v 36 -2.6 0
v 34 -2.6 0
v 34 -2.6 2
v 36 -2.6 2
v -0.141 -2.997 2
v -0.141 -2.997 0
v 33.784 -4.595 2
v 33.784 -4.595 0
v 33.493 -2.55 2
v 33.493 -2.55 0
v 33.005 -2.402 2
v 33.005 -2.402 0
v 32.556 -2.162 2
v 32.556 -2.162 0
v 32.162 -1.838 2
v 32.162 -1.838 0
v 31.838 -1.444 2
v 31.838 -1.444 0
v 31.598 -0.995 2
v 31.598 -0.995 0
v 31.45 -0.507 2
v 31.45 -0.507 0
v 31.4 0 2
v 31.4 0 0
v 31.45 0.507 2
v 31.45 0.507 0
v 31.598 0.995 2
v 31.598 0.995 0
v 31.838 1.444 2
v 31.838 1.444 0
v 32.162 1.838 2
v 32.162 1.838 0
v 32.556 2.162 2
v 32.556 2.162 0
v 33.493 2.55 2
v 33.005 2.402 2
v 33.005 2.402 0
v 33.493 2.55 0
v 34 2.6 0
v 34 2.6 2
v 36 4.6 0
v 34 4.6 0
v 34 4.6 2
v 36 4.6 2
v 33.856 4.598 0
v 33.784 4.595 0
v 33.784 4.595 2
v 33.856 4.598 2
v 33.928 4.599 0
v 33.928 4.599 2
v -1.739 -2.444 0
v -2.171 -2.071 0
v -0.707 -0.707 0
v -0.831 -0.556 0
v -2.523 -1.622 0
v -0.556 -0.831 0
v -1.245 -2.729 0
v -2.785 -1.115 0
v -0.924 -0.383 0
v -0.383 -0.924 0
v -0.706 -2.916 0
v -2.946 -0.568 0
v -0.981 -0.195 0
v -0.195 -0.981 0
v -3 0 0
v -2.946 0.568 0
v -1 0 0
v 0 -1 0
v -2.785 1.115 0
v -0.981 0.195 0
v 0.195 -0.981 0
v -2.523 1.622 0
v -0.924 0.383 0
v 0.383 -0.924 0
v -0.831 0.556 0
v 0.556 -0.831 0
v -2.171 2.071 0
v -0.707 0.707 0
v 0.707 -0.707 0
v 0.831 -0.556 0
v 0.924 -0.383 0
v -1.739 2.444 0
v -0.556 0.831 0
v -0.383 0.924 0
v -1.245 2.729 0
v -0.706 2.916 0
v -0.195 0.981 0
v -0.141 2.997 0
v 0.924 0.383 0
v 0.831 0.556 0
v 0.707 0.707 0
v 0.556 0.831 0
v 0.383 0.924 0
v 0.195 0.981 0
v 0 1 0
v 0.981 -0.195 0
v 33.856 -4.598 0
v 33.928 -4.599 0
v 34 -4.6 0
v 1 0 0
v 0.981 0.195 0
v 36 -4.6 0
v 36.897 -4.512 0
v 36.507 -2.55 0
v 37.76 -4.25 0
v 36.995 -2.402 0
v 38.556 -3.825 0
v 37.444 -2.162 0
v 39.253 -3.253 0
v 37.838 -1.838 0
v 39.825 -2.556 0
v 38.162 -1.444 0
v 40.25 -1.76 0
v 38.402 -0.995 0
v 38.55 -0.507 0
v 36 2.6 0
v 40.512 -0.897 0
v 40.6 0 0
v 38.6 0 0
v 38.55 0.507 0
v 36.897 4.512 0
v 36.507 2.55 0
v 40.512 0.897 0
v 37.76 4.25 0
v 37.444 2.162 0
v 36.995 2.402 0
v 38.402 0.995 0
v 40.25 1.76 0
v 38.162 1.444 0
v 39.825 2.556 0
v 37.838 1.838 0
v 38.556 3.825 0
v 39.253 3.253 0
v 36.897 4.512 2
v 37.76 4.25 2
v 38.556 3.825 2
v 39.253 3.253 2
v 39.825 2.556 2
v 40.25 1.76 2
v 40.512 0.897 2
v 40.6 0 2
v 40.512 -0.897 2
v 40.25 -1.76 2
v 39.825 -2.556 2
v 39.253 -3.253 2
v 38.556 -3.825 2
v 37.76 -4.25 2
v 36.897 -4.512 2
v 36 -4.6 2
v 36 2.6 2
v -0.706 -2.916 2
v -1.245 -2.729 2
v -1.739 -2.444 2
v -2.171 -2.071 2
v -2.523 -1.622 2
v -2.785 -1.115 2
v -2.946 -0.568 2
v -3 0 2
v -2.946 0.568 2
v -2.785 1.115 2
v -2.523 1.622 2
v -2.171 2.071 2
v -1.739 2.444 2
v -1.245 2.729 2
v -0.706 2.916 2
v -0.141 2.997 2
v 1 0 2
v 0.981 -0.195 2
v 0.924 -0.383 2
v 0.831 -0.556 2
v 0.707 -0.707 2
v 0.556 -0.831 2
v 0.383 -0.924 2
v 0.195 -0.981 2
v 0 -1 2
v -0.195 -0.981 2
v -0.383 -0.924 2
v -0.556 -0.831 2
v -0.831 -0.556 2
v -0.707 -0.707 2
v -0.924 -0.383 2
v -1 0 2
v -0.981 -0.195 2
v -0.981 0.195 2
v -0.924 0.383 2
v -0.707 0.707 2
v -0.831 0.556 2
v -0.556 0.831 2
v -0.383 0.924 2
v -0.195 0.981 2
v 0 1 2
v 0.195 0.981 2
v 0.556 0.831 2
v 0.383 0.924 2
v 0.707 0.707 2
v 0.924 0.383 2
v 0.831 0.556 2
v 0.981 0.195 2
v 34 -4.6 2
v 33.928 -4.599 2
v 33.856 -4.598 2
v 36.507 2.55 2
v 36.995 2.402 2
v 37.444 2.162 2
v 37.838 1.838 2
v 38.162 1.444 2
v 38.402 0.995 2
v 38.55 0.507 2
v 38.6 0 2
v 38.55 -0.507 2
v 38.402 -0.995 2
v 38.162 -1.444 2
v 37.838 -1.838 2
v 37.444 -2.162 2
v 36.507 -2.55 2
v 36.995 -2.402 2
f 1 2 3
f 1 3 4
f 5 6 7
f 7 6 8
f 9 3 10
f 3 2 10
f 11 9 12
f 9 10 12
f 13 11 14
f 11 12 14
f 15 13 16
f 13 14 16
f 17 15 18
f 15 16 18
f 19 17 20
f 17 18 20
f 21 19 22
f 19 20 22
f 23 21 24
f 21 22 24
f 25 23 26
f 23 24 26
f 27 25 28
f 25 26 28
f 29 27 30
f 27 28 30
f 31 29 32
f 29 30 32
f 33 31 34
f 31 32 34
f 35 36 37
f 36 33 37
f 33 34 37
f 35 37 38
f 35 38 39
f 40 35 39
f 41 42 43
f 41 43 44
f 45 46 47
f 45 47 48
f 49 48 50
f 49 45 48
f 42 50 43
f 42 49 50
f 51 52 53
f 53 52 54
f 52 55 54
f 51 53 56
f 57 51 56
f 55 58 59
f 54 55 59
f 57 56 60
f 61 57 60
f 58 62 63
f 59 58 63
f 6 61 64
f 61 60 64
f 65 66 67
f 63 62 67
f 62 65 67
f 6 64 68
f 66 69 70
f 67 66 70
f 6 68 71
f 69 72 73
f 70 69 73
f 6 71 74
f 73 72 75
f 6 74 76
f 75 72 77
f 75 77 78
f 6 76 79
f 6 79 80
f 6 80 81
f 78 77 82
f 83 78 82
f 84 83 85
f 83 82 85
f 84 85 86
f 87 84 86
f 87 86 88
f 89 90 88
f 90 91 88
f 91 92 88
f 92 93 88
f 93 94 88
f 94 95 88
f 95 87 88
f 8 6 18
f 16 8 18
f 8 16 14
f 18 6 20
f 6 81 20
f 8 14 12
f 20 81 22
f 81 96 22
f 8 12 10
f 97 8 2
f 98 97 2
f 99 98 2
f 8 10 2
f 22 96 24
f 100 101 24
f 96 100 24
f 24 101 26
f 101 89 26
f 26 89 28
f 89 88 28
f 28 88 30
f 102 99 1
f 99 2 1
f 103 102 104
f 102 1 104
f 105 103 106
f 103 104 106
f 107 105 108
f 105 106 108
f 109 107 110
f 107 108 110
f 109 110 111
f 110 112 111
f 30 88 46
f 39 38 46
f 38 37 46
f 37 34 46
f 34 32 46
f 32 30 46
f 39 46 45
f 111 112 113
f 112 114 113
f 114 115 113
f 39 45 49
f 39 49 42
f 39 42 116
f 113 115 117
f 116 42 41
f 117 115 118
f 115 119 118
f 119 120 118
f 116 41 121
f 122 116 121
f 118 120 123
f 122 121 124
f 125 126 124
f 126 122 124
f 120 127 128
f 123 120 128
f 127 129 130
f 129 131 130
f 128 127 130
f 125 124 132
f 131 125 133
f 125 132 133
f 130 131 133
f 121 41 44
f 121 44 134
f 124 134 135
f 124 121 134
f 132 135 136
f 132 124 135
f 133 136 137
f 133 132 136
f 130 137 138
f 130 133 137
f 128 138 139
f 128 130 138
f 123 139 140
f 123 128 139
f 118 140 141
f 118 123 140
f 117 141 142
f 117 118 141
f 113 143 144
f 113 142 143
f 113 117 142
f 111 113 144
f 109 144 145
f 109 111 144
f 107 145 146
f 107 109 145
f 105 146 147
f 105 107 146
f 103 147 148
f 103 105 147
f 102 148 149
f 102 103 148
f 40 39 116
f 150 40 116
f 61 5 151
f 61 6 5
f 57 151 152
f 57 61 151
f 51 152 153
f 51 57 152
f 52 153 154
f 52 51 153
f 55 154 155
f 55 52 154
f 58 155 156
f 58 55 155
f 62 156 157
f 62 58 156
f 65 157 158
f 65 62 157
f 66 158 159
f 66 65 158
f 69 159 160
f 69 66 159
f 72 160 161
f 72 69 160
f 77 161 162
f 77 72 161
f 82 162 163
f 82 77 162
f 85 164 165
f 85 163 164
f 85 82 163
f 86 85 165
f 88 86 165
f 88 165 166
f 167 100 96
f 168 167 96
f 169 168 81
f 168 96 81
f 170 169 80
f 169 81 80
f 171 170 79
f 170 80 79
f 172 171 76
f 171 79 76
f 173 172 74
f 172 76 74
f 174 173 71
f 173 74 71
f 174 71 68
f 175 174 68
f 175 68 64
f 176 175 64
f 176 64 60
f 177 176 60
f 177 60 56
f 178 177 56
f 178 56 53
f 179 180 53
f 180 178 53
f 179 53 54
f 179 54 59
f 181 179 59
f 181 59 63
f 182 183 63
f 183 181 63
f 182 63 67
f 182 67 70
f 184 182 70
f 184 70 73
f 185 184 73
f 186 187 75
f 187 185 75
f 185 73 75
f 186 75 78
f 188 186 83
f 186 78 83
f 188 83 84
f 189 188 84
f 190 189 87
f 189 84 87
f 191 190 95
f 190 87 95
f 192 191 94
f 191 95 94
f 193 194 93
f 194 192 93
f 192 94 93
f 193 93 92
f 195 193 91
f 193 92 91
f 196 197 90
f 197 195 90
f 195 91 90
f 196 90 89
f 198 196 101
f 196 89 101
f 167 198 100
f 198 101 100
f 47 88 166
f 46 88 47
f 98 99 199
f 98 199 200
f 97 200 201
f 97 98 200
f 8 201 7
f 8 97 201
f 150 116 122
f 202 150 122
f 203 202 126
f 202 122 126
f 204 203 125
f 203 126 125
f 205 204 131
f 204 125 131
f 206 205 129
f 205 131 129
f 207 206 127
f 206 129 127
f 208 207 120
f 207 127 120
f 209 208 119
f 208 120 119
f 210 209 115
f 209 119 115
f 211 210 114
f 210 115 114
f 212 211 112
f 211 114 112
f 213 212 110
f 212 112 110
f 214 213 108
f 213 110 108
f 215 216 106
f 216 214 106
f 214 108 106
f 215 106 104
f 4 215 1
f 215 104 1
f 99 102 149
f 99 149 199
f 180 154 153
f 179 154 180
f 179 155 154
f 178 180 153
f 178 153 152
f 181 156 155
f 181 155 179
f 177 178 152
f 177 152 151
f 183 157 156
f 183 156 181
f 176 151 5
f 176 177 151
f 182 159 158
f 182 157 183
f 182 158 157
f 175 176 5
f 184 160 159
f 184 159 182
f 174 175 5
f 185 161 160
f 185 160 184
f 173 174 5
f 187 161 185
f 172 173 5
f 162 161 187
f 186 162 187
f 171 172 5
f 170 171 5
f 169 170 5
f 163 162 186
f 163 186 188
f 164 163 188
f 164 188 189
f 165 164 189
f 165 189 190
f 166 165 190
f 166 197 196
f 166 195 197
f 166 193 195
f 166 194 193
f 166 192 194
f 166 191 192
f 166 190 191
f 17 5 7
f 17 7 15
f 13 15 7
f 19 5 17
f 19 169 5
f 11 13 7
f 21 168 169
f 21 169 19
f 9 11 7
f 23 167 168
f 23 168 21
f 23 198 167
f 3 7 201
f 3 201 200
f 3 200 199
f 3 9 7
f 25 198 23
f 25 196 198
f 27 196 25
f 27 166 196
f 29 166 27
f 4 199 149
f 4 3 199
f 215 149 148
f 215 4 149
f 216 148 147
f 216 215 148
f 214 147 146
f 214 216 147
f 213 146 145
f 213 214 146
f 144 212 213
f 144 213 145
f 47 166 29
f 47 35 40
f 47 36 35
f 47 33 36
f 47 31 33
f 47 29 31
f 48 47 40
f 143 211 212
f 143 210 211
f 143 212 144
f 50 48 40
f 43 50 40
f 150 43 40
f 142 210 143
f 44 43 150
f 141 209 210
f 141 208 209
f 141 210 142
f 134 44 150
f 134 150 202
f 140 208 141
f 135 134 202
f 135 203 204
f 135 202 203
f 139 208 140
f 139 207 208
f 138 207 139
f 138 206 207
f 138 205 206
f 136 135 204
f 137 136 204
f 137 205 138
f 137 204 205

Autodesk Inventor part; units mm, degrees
ref_plane "YZ Plane" through (0, 0, 0) normal (1, 0, 0) x (0, 1, 0)
ref_plane "XZ Plane" through (0, 0, 0) normal (0, 1, 0) x (-1, 0, 0)
ref_plane "XY Plane" through (0, 0, 0) normal (0, 0, 1) x (1, 0, 0)
sketch "Sketch1" plane through (0, 0, 0) normal (0, 0, 1) x (1, 0, 0)
  circle A0 centre (0, 0) radius 1
  arc A1 (34, 2.6) -> (34, -2.6) centre (34, 0) ccw
  line L0 (34, 2.6) -> (36, 2.6)
  line L1 (34, -2.6) -> (36, -2.6)
  arc A2 (36, -2.6) -> (36, 2.6) centre (36, 0) ccw
  arc A3 (-0.1412, 2.9967) -> (-0.1412, -2.9967) centre (0, 0) ccw
  line L2 (34, 4.6) -> (36, 4.6)
  arc A4 (36, -4.6) -> (36, 4.6) centre (36, 0) ccw
  line L3 (36, -4.6) -> (34, -4.6)
  line L4 (-0.1412, 2.9967) -> (33.7835, 4.5949)
  line L5 (12.7162, 0) -> (28.1806, 0)
  line L6 (-0.1412, -2.9967) -> (33.7835, -4.5949)
  arc A5 (34, 4.6) -> (33.7835, 4.5949) centre (34, 0) ccw
  arc A6 (33.7835, -4.5949) -> (34, -4.6) centre (34, 0) ccw
  dimension "d0" = 2
  dimension "d1" = 5.2
  dimension "d2" = 34
  dimension "d3" = 2
  dimension "d4" = 2
extrude "Extrusion1" add sketch "Sketch1" along normal blind 2
properties part number "rotasyonpini"
